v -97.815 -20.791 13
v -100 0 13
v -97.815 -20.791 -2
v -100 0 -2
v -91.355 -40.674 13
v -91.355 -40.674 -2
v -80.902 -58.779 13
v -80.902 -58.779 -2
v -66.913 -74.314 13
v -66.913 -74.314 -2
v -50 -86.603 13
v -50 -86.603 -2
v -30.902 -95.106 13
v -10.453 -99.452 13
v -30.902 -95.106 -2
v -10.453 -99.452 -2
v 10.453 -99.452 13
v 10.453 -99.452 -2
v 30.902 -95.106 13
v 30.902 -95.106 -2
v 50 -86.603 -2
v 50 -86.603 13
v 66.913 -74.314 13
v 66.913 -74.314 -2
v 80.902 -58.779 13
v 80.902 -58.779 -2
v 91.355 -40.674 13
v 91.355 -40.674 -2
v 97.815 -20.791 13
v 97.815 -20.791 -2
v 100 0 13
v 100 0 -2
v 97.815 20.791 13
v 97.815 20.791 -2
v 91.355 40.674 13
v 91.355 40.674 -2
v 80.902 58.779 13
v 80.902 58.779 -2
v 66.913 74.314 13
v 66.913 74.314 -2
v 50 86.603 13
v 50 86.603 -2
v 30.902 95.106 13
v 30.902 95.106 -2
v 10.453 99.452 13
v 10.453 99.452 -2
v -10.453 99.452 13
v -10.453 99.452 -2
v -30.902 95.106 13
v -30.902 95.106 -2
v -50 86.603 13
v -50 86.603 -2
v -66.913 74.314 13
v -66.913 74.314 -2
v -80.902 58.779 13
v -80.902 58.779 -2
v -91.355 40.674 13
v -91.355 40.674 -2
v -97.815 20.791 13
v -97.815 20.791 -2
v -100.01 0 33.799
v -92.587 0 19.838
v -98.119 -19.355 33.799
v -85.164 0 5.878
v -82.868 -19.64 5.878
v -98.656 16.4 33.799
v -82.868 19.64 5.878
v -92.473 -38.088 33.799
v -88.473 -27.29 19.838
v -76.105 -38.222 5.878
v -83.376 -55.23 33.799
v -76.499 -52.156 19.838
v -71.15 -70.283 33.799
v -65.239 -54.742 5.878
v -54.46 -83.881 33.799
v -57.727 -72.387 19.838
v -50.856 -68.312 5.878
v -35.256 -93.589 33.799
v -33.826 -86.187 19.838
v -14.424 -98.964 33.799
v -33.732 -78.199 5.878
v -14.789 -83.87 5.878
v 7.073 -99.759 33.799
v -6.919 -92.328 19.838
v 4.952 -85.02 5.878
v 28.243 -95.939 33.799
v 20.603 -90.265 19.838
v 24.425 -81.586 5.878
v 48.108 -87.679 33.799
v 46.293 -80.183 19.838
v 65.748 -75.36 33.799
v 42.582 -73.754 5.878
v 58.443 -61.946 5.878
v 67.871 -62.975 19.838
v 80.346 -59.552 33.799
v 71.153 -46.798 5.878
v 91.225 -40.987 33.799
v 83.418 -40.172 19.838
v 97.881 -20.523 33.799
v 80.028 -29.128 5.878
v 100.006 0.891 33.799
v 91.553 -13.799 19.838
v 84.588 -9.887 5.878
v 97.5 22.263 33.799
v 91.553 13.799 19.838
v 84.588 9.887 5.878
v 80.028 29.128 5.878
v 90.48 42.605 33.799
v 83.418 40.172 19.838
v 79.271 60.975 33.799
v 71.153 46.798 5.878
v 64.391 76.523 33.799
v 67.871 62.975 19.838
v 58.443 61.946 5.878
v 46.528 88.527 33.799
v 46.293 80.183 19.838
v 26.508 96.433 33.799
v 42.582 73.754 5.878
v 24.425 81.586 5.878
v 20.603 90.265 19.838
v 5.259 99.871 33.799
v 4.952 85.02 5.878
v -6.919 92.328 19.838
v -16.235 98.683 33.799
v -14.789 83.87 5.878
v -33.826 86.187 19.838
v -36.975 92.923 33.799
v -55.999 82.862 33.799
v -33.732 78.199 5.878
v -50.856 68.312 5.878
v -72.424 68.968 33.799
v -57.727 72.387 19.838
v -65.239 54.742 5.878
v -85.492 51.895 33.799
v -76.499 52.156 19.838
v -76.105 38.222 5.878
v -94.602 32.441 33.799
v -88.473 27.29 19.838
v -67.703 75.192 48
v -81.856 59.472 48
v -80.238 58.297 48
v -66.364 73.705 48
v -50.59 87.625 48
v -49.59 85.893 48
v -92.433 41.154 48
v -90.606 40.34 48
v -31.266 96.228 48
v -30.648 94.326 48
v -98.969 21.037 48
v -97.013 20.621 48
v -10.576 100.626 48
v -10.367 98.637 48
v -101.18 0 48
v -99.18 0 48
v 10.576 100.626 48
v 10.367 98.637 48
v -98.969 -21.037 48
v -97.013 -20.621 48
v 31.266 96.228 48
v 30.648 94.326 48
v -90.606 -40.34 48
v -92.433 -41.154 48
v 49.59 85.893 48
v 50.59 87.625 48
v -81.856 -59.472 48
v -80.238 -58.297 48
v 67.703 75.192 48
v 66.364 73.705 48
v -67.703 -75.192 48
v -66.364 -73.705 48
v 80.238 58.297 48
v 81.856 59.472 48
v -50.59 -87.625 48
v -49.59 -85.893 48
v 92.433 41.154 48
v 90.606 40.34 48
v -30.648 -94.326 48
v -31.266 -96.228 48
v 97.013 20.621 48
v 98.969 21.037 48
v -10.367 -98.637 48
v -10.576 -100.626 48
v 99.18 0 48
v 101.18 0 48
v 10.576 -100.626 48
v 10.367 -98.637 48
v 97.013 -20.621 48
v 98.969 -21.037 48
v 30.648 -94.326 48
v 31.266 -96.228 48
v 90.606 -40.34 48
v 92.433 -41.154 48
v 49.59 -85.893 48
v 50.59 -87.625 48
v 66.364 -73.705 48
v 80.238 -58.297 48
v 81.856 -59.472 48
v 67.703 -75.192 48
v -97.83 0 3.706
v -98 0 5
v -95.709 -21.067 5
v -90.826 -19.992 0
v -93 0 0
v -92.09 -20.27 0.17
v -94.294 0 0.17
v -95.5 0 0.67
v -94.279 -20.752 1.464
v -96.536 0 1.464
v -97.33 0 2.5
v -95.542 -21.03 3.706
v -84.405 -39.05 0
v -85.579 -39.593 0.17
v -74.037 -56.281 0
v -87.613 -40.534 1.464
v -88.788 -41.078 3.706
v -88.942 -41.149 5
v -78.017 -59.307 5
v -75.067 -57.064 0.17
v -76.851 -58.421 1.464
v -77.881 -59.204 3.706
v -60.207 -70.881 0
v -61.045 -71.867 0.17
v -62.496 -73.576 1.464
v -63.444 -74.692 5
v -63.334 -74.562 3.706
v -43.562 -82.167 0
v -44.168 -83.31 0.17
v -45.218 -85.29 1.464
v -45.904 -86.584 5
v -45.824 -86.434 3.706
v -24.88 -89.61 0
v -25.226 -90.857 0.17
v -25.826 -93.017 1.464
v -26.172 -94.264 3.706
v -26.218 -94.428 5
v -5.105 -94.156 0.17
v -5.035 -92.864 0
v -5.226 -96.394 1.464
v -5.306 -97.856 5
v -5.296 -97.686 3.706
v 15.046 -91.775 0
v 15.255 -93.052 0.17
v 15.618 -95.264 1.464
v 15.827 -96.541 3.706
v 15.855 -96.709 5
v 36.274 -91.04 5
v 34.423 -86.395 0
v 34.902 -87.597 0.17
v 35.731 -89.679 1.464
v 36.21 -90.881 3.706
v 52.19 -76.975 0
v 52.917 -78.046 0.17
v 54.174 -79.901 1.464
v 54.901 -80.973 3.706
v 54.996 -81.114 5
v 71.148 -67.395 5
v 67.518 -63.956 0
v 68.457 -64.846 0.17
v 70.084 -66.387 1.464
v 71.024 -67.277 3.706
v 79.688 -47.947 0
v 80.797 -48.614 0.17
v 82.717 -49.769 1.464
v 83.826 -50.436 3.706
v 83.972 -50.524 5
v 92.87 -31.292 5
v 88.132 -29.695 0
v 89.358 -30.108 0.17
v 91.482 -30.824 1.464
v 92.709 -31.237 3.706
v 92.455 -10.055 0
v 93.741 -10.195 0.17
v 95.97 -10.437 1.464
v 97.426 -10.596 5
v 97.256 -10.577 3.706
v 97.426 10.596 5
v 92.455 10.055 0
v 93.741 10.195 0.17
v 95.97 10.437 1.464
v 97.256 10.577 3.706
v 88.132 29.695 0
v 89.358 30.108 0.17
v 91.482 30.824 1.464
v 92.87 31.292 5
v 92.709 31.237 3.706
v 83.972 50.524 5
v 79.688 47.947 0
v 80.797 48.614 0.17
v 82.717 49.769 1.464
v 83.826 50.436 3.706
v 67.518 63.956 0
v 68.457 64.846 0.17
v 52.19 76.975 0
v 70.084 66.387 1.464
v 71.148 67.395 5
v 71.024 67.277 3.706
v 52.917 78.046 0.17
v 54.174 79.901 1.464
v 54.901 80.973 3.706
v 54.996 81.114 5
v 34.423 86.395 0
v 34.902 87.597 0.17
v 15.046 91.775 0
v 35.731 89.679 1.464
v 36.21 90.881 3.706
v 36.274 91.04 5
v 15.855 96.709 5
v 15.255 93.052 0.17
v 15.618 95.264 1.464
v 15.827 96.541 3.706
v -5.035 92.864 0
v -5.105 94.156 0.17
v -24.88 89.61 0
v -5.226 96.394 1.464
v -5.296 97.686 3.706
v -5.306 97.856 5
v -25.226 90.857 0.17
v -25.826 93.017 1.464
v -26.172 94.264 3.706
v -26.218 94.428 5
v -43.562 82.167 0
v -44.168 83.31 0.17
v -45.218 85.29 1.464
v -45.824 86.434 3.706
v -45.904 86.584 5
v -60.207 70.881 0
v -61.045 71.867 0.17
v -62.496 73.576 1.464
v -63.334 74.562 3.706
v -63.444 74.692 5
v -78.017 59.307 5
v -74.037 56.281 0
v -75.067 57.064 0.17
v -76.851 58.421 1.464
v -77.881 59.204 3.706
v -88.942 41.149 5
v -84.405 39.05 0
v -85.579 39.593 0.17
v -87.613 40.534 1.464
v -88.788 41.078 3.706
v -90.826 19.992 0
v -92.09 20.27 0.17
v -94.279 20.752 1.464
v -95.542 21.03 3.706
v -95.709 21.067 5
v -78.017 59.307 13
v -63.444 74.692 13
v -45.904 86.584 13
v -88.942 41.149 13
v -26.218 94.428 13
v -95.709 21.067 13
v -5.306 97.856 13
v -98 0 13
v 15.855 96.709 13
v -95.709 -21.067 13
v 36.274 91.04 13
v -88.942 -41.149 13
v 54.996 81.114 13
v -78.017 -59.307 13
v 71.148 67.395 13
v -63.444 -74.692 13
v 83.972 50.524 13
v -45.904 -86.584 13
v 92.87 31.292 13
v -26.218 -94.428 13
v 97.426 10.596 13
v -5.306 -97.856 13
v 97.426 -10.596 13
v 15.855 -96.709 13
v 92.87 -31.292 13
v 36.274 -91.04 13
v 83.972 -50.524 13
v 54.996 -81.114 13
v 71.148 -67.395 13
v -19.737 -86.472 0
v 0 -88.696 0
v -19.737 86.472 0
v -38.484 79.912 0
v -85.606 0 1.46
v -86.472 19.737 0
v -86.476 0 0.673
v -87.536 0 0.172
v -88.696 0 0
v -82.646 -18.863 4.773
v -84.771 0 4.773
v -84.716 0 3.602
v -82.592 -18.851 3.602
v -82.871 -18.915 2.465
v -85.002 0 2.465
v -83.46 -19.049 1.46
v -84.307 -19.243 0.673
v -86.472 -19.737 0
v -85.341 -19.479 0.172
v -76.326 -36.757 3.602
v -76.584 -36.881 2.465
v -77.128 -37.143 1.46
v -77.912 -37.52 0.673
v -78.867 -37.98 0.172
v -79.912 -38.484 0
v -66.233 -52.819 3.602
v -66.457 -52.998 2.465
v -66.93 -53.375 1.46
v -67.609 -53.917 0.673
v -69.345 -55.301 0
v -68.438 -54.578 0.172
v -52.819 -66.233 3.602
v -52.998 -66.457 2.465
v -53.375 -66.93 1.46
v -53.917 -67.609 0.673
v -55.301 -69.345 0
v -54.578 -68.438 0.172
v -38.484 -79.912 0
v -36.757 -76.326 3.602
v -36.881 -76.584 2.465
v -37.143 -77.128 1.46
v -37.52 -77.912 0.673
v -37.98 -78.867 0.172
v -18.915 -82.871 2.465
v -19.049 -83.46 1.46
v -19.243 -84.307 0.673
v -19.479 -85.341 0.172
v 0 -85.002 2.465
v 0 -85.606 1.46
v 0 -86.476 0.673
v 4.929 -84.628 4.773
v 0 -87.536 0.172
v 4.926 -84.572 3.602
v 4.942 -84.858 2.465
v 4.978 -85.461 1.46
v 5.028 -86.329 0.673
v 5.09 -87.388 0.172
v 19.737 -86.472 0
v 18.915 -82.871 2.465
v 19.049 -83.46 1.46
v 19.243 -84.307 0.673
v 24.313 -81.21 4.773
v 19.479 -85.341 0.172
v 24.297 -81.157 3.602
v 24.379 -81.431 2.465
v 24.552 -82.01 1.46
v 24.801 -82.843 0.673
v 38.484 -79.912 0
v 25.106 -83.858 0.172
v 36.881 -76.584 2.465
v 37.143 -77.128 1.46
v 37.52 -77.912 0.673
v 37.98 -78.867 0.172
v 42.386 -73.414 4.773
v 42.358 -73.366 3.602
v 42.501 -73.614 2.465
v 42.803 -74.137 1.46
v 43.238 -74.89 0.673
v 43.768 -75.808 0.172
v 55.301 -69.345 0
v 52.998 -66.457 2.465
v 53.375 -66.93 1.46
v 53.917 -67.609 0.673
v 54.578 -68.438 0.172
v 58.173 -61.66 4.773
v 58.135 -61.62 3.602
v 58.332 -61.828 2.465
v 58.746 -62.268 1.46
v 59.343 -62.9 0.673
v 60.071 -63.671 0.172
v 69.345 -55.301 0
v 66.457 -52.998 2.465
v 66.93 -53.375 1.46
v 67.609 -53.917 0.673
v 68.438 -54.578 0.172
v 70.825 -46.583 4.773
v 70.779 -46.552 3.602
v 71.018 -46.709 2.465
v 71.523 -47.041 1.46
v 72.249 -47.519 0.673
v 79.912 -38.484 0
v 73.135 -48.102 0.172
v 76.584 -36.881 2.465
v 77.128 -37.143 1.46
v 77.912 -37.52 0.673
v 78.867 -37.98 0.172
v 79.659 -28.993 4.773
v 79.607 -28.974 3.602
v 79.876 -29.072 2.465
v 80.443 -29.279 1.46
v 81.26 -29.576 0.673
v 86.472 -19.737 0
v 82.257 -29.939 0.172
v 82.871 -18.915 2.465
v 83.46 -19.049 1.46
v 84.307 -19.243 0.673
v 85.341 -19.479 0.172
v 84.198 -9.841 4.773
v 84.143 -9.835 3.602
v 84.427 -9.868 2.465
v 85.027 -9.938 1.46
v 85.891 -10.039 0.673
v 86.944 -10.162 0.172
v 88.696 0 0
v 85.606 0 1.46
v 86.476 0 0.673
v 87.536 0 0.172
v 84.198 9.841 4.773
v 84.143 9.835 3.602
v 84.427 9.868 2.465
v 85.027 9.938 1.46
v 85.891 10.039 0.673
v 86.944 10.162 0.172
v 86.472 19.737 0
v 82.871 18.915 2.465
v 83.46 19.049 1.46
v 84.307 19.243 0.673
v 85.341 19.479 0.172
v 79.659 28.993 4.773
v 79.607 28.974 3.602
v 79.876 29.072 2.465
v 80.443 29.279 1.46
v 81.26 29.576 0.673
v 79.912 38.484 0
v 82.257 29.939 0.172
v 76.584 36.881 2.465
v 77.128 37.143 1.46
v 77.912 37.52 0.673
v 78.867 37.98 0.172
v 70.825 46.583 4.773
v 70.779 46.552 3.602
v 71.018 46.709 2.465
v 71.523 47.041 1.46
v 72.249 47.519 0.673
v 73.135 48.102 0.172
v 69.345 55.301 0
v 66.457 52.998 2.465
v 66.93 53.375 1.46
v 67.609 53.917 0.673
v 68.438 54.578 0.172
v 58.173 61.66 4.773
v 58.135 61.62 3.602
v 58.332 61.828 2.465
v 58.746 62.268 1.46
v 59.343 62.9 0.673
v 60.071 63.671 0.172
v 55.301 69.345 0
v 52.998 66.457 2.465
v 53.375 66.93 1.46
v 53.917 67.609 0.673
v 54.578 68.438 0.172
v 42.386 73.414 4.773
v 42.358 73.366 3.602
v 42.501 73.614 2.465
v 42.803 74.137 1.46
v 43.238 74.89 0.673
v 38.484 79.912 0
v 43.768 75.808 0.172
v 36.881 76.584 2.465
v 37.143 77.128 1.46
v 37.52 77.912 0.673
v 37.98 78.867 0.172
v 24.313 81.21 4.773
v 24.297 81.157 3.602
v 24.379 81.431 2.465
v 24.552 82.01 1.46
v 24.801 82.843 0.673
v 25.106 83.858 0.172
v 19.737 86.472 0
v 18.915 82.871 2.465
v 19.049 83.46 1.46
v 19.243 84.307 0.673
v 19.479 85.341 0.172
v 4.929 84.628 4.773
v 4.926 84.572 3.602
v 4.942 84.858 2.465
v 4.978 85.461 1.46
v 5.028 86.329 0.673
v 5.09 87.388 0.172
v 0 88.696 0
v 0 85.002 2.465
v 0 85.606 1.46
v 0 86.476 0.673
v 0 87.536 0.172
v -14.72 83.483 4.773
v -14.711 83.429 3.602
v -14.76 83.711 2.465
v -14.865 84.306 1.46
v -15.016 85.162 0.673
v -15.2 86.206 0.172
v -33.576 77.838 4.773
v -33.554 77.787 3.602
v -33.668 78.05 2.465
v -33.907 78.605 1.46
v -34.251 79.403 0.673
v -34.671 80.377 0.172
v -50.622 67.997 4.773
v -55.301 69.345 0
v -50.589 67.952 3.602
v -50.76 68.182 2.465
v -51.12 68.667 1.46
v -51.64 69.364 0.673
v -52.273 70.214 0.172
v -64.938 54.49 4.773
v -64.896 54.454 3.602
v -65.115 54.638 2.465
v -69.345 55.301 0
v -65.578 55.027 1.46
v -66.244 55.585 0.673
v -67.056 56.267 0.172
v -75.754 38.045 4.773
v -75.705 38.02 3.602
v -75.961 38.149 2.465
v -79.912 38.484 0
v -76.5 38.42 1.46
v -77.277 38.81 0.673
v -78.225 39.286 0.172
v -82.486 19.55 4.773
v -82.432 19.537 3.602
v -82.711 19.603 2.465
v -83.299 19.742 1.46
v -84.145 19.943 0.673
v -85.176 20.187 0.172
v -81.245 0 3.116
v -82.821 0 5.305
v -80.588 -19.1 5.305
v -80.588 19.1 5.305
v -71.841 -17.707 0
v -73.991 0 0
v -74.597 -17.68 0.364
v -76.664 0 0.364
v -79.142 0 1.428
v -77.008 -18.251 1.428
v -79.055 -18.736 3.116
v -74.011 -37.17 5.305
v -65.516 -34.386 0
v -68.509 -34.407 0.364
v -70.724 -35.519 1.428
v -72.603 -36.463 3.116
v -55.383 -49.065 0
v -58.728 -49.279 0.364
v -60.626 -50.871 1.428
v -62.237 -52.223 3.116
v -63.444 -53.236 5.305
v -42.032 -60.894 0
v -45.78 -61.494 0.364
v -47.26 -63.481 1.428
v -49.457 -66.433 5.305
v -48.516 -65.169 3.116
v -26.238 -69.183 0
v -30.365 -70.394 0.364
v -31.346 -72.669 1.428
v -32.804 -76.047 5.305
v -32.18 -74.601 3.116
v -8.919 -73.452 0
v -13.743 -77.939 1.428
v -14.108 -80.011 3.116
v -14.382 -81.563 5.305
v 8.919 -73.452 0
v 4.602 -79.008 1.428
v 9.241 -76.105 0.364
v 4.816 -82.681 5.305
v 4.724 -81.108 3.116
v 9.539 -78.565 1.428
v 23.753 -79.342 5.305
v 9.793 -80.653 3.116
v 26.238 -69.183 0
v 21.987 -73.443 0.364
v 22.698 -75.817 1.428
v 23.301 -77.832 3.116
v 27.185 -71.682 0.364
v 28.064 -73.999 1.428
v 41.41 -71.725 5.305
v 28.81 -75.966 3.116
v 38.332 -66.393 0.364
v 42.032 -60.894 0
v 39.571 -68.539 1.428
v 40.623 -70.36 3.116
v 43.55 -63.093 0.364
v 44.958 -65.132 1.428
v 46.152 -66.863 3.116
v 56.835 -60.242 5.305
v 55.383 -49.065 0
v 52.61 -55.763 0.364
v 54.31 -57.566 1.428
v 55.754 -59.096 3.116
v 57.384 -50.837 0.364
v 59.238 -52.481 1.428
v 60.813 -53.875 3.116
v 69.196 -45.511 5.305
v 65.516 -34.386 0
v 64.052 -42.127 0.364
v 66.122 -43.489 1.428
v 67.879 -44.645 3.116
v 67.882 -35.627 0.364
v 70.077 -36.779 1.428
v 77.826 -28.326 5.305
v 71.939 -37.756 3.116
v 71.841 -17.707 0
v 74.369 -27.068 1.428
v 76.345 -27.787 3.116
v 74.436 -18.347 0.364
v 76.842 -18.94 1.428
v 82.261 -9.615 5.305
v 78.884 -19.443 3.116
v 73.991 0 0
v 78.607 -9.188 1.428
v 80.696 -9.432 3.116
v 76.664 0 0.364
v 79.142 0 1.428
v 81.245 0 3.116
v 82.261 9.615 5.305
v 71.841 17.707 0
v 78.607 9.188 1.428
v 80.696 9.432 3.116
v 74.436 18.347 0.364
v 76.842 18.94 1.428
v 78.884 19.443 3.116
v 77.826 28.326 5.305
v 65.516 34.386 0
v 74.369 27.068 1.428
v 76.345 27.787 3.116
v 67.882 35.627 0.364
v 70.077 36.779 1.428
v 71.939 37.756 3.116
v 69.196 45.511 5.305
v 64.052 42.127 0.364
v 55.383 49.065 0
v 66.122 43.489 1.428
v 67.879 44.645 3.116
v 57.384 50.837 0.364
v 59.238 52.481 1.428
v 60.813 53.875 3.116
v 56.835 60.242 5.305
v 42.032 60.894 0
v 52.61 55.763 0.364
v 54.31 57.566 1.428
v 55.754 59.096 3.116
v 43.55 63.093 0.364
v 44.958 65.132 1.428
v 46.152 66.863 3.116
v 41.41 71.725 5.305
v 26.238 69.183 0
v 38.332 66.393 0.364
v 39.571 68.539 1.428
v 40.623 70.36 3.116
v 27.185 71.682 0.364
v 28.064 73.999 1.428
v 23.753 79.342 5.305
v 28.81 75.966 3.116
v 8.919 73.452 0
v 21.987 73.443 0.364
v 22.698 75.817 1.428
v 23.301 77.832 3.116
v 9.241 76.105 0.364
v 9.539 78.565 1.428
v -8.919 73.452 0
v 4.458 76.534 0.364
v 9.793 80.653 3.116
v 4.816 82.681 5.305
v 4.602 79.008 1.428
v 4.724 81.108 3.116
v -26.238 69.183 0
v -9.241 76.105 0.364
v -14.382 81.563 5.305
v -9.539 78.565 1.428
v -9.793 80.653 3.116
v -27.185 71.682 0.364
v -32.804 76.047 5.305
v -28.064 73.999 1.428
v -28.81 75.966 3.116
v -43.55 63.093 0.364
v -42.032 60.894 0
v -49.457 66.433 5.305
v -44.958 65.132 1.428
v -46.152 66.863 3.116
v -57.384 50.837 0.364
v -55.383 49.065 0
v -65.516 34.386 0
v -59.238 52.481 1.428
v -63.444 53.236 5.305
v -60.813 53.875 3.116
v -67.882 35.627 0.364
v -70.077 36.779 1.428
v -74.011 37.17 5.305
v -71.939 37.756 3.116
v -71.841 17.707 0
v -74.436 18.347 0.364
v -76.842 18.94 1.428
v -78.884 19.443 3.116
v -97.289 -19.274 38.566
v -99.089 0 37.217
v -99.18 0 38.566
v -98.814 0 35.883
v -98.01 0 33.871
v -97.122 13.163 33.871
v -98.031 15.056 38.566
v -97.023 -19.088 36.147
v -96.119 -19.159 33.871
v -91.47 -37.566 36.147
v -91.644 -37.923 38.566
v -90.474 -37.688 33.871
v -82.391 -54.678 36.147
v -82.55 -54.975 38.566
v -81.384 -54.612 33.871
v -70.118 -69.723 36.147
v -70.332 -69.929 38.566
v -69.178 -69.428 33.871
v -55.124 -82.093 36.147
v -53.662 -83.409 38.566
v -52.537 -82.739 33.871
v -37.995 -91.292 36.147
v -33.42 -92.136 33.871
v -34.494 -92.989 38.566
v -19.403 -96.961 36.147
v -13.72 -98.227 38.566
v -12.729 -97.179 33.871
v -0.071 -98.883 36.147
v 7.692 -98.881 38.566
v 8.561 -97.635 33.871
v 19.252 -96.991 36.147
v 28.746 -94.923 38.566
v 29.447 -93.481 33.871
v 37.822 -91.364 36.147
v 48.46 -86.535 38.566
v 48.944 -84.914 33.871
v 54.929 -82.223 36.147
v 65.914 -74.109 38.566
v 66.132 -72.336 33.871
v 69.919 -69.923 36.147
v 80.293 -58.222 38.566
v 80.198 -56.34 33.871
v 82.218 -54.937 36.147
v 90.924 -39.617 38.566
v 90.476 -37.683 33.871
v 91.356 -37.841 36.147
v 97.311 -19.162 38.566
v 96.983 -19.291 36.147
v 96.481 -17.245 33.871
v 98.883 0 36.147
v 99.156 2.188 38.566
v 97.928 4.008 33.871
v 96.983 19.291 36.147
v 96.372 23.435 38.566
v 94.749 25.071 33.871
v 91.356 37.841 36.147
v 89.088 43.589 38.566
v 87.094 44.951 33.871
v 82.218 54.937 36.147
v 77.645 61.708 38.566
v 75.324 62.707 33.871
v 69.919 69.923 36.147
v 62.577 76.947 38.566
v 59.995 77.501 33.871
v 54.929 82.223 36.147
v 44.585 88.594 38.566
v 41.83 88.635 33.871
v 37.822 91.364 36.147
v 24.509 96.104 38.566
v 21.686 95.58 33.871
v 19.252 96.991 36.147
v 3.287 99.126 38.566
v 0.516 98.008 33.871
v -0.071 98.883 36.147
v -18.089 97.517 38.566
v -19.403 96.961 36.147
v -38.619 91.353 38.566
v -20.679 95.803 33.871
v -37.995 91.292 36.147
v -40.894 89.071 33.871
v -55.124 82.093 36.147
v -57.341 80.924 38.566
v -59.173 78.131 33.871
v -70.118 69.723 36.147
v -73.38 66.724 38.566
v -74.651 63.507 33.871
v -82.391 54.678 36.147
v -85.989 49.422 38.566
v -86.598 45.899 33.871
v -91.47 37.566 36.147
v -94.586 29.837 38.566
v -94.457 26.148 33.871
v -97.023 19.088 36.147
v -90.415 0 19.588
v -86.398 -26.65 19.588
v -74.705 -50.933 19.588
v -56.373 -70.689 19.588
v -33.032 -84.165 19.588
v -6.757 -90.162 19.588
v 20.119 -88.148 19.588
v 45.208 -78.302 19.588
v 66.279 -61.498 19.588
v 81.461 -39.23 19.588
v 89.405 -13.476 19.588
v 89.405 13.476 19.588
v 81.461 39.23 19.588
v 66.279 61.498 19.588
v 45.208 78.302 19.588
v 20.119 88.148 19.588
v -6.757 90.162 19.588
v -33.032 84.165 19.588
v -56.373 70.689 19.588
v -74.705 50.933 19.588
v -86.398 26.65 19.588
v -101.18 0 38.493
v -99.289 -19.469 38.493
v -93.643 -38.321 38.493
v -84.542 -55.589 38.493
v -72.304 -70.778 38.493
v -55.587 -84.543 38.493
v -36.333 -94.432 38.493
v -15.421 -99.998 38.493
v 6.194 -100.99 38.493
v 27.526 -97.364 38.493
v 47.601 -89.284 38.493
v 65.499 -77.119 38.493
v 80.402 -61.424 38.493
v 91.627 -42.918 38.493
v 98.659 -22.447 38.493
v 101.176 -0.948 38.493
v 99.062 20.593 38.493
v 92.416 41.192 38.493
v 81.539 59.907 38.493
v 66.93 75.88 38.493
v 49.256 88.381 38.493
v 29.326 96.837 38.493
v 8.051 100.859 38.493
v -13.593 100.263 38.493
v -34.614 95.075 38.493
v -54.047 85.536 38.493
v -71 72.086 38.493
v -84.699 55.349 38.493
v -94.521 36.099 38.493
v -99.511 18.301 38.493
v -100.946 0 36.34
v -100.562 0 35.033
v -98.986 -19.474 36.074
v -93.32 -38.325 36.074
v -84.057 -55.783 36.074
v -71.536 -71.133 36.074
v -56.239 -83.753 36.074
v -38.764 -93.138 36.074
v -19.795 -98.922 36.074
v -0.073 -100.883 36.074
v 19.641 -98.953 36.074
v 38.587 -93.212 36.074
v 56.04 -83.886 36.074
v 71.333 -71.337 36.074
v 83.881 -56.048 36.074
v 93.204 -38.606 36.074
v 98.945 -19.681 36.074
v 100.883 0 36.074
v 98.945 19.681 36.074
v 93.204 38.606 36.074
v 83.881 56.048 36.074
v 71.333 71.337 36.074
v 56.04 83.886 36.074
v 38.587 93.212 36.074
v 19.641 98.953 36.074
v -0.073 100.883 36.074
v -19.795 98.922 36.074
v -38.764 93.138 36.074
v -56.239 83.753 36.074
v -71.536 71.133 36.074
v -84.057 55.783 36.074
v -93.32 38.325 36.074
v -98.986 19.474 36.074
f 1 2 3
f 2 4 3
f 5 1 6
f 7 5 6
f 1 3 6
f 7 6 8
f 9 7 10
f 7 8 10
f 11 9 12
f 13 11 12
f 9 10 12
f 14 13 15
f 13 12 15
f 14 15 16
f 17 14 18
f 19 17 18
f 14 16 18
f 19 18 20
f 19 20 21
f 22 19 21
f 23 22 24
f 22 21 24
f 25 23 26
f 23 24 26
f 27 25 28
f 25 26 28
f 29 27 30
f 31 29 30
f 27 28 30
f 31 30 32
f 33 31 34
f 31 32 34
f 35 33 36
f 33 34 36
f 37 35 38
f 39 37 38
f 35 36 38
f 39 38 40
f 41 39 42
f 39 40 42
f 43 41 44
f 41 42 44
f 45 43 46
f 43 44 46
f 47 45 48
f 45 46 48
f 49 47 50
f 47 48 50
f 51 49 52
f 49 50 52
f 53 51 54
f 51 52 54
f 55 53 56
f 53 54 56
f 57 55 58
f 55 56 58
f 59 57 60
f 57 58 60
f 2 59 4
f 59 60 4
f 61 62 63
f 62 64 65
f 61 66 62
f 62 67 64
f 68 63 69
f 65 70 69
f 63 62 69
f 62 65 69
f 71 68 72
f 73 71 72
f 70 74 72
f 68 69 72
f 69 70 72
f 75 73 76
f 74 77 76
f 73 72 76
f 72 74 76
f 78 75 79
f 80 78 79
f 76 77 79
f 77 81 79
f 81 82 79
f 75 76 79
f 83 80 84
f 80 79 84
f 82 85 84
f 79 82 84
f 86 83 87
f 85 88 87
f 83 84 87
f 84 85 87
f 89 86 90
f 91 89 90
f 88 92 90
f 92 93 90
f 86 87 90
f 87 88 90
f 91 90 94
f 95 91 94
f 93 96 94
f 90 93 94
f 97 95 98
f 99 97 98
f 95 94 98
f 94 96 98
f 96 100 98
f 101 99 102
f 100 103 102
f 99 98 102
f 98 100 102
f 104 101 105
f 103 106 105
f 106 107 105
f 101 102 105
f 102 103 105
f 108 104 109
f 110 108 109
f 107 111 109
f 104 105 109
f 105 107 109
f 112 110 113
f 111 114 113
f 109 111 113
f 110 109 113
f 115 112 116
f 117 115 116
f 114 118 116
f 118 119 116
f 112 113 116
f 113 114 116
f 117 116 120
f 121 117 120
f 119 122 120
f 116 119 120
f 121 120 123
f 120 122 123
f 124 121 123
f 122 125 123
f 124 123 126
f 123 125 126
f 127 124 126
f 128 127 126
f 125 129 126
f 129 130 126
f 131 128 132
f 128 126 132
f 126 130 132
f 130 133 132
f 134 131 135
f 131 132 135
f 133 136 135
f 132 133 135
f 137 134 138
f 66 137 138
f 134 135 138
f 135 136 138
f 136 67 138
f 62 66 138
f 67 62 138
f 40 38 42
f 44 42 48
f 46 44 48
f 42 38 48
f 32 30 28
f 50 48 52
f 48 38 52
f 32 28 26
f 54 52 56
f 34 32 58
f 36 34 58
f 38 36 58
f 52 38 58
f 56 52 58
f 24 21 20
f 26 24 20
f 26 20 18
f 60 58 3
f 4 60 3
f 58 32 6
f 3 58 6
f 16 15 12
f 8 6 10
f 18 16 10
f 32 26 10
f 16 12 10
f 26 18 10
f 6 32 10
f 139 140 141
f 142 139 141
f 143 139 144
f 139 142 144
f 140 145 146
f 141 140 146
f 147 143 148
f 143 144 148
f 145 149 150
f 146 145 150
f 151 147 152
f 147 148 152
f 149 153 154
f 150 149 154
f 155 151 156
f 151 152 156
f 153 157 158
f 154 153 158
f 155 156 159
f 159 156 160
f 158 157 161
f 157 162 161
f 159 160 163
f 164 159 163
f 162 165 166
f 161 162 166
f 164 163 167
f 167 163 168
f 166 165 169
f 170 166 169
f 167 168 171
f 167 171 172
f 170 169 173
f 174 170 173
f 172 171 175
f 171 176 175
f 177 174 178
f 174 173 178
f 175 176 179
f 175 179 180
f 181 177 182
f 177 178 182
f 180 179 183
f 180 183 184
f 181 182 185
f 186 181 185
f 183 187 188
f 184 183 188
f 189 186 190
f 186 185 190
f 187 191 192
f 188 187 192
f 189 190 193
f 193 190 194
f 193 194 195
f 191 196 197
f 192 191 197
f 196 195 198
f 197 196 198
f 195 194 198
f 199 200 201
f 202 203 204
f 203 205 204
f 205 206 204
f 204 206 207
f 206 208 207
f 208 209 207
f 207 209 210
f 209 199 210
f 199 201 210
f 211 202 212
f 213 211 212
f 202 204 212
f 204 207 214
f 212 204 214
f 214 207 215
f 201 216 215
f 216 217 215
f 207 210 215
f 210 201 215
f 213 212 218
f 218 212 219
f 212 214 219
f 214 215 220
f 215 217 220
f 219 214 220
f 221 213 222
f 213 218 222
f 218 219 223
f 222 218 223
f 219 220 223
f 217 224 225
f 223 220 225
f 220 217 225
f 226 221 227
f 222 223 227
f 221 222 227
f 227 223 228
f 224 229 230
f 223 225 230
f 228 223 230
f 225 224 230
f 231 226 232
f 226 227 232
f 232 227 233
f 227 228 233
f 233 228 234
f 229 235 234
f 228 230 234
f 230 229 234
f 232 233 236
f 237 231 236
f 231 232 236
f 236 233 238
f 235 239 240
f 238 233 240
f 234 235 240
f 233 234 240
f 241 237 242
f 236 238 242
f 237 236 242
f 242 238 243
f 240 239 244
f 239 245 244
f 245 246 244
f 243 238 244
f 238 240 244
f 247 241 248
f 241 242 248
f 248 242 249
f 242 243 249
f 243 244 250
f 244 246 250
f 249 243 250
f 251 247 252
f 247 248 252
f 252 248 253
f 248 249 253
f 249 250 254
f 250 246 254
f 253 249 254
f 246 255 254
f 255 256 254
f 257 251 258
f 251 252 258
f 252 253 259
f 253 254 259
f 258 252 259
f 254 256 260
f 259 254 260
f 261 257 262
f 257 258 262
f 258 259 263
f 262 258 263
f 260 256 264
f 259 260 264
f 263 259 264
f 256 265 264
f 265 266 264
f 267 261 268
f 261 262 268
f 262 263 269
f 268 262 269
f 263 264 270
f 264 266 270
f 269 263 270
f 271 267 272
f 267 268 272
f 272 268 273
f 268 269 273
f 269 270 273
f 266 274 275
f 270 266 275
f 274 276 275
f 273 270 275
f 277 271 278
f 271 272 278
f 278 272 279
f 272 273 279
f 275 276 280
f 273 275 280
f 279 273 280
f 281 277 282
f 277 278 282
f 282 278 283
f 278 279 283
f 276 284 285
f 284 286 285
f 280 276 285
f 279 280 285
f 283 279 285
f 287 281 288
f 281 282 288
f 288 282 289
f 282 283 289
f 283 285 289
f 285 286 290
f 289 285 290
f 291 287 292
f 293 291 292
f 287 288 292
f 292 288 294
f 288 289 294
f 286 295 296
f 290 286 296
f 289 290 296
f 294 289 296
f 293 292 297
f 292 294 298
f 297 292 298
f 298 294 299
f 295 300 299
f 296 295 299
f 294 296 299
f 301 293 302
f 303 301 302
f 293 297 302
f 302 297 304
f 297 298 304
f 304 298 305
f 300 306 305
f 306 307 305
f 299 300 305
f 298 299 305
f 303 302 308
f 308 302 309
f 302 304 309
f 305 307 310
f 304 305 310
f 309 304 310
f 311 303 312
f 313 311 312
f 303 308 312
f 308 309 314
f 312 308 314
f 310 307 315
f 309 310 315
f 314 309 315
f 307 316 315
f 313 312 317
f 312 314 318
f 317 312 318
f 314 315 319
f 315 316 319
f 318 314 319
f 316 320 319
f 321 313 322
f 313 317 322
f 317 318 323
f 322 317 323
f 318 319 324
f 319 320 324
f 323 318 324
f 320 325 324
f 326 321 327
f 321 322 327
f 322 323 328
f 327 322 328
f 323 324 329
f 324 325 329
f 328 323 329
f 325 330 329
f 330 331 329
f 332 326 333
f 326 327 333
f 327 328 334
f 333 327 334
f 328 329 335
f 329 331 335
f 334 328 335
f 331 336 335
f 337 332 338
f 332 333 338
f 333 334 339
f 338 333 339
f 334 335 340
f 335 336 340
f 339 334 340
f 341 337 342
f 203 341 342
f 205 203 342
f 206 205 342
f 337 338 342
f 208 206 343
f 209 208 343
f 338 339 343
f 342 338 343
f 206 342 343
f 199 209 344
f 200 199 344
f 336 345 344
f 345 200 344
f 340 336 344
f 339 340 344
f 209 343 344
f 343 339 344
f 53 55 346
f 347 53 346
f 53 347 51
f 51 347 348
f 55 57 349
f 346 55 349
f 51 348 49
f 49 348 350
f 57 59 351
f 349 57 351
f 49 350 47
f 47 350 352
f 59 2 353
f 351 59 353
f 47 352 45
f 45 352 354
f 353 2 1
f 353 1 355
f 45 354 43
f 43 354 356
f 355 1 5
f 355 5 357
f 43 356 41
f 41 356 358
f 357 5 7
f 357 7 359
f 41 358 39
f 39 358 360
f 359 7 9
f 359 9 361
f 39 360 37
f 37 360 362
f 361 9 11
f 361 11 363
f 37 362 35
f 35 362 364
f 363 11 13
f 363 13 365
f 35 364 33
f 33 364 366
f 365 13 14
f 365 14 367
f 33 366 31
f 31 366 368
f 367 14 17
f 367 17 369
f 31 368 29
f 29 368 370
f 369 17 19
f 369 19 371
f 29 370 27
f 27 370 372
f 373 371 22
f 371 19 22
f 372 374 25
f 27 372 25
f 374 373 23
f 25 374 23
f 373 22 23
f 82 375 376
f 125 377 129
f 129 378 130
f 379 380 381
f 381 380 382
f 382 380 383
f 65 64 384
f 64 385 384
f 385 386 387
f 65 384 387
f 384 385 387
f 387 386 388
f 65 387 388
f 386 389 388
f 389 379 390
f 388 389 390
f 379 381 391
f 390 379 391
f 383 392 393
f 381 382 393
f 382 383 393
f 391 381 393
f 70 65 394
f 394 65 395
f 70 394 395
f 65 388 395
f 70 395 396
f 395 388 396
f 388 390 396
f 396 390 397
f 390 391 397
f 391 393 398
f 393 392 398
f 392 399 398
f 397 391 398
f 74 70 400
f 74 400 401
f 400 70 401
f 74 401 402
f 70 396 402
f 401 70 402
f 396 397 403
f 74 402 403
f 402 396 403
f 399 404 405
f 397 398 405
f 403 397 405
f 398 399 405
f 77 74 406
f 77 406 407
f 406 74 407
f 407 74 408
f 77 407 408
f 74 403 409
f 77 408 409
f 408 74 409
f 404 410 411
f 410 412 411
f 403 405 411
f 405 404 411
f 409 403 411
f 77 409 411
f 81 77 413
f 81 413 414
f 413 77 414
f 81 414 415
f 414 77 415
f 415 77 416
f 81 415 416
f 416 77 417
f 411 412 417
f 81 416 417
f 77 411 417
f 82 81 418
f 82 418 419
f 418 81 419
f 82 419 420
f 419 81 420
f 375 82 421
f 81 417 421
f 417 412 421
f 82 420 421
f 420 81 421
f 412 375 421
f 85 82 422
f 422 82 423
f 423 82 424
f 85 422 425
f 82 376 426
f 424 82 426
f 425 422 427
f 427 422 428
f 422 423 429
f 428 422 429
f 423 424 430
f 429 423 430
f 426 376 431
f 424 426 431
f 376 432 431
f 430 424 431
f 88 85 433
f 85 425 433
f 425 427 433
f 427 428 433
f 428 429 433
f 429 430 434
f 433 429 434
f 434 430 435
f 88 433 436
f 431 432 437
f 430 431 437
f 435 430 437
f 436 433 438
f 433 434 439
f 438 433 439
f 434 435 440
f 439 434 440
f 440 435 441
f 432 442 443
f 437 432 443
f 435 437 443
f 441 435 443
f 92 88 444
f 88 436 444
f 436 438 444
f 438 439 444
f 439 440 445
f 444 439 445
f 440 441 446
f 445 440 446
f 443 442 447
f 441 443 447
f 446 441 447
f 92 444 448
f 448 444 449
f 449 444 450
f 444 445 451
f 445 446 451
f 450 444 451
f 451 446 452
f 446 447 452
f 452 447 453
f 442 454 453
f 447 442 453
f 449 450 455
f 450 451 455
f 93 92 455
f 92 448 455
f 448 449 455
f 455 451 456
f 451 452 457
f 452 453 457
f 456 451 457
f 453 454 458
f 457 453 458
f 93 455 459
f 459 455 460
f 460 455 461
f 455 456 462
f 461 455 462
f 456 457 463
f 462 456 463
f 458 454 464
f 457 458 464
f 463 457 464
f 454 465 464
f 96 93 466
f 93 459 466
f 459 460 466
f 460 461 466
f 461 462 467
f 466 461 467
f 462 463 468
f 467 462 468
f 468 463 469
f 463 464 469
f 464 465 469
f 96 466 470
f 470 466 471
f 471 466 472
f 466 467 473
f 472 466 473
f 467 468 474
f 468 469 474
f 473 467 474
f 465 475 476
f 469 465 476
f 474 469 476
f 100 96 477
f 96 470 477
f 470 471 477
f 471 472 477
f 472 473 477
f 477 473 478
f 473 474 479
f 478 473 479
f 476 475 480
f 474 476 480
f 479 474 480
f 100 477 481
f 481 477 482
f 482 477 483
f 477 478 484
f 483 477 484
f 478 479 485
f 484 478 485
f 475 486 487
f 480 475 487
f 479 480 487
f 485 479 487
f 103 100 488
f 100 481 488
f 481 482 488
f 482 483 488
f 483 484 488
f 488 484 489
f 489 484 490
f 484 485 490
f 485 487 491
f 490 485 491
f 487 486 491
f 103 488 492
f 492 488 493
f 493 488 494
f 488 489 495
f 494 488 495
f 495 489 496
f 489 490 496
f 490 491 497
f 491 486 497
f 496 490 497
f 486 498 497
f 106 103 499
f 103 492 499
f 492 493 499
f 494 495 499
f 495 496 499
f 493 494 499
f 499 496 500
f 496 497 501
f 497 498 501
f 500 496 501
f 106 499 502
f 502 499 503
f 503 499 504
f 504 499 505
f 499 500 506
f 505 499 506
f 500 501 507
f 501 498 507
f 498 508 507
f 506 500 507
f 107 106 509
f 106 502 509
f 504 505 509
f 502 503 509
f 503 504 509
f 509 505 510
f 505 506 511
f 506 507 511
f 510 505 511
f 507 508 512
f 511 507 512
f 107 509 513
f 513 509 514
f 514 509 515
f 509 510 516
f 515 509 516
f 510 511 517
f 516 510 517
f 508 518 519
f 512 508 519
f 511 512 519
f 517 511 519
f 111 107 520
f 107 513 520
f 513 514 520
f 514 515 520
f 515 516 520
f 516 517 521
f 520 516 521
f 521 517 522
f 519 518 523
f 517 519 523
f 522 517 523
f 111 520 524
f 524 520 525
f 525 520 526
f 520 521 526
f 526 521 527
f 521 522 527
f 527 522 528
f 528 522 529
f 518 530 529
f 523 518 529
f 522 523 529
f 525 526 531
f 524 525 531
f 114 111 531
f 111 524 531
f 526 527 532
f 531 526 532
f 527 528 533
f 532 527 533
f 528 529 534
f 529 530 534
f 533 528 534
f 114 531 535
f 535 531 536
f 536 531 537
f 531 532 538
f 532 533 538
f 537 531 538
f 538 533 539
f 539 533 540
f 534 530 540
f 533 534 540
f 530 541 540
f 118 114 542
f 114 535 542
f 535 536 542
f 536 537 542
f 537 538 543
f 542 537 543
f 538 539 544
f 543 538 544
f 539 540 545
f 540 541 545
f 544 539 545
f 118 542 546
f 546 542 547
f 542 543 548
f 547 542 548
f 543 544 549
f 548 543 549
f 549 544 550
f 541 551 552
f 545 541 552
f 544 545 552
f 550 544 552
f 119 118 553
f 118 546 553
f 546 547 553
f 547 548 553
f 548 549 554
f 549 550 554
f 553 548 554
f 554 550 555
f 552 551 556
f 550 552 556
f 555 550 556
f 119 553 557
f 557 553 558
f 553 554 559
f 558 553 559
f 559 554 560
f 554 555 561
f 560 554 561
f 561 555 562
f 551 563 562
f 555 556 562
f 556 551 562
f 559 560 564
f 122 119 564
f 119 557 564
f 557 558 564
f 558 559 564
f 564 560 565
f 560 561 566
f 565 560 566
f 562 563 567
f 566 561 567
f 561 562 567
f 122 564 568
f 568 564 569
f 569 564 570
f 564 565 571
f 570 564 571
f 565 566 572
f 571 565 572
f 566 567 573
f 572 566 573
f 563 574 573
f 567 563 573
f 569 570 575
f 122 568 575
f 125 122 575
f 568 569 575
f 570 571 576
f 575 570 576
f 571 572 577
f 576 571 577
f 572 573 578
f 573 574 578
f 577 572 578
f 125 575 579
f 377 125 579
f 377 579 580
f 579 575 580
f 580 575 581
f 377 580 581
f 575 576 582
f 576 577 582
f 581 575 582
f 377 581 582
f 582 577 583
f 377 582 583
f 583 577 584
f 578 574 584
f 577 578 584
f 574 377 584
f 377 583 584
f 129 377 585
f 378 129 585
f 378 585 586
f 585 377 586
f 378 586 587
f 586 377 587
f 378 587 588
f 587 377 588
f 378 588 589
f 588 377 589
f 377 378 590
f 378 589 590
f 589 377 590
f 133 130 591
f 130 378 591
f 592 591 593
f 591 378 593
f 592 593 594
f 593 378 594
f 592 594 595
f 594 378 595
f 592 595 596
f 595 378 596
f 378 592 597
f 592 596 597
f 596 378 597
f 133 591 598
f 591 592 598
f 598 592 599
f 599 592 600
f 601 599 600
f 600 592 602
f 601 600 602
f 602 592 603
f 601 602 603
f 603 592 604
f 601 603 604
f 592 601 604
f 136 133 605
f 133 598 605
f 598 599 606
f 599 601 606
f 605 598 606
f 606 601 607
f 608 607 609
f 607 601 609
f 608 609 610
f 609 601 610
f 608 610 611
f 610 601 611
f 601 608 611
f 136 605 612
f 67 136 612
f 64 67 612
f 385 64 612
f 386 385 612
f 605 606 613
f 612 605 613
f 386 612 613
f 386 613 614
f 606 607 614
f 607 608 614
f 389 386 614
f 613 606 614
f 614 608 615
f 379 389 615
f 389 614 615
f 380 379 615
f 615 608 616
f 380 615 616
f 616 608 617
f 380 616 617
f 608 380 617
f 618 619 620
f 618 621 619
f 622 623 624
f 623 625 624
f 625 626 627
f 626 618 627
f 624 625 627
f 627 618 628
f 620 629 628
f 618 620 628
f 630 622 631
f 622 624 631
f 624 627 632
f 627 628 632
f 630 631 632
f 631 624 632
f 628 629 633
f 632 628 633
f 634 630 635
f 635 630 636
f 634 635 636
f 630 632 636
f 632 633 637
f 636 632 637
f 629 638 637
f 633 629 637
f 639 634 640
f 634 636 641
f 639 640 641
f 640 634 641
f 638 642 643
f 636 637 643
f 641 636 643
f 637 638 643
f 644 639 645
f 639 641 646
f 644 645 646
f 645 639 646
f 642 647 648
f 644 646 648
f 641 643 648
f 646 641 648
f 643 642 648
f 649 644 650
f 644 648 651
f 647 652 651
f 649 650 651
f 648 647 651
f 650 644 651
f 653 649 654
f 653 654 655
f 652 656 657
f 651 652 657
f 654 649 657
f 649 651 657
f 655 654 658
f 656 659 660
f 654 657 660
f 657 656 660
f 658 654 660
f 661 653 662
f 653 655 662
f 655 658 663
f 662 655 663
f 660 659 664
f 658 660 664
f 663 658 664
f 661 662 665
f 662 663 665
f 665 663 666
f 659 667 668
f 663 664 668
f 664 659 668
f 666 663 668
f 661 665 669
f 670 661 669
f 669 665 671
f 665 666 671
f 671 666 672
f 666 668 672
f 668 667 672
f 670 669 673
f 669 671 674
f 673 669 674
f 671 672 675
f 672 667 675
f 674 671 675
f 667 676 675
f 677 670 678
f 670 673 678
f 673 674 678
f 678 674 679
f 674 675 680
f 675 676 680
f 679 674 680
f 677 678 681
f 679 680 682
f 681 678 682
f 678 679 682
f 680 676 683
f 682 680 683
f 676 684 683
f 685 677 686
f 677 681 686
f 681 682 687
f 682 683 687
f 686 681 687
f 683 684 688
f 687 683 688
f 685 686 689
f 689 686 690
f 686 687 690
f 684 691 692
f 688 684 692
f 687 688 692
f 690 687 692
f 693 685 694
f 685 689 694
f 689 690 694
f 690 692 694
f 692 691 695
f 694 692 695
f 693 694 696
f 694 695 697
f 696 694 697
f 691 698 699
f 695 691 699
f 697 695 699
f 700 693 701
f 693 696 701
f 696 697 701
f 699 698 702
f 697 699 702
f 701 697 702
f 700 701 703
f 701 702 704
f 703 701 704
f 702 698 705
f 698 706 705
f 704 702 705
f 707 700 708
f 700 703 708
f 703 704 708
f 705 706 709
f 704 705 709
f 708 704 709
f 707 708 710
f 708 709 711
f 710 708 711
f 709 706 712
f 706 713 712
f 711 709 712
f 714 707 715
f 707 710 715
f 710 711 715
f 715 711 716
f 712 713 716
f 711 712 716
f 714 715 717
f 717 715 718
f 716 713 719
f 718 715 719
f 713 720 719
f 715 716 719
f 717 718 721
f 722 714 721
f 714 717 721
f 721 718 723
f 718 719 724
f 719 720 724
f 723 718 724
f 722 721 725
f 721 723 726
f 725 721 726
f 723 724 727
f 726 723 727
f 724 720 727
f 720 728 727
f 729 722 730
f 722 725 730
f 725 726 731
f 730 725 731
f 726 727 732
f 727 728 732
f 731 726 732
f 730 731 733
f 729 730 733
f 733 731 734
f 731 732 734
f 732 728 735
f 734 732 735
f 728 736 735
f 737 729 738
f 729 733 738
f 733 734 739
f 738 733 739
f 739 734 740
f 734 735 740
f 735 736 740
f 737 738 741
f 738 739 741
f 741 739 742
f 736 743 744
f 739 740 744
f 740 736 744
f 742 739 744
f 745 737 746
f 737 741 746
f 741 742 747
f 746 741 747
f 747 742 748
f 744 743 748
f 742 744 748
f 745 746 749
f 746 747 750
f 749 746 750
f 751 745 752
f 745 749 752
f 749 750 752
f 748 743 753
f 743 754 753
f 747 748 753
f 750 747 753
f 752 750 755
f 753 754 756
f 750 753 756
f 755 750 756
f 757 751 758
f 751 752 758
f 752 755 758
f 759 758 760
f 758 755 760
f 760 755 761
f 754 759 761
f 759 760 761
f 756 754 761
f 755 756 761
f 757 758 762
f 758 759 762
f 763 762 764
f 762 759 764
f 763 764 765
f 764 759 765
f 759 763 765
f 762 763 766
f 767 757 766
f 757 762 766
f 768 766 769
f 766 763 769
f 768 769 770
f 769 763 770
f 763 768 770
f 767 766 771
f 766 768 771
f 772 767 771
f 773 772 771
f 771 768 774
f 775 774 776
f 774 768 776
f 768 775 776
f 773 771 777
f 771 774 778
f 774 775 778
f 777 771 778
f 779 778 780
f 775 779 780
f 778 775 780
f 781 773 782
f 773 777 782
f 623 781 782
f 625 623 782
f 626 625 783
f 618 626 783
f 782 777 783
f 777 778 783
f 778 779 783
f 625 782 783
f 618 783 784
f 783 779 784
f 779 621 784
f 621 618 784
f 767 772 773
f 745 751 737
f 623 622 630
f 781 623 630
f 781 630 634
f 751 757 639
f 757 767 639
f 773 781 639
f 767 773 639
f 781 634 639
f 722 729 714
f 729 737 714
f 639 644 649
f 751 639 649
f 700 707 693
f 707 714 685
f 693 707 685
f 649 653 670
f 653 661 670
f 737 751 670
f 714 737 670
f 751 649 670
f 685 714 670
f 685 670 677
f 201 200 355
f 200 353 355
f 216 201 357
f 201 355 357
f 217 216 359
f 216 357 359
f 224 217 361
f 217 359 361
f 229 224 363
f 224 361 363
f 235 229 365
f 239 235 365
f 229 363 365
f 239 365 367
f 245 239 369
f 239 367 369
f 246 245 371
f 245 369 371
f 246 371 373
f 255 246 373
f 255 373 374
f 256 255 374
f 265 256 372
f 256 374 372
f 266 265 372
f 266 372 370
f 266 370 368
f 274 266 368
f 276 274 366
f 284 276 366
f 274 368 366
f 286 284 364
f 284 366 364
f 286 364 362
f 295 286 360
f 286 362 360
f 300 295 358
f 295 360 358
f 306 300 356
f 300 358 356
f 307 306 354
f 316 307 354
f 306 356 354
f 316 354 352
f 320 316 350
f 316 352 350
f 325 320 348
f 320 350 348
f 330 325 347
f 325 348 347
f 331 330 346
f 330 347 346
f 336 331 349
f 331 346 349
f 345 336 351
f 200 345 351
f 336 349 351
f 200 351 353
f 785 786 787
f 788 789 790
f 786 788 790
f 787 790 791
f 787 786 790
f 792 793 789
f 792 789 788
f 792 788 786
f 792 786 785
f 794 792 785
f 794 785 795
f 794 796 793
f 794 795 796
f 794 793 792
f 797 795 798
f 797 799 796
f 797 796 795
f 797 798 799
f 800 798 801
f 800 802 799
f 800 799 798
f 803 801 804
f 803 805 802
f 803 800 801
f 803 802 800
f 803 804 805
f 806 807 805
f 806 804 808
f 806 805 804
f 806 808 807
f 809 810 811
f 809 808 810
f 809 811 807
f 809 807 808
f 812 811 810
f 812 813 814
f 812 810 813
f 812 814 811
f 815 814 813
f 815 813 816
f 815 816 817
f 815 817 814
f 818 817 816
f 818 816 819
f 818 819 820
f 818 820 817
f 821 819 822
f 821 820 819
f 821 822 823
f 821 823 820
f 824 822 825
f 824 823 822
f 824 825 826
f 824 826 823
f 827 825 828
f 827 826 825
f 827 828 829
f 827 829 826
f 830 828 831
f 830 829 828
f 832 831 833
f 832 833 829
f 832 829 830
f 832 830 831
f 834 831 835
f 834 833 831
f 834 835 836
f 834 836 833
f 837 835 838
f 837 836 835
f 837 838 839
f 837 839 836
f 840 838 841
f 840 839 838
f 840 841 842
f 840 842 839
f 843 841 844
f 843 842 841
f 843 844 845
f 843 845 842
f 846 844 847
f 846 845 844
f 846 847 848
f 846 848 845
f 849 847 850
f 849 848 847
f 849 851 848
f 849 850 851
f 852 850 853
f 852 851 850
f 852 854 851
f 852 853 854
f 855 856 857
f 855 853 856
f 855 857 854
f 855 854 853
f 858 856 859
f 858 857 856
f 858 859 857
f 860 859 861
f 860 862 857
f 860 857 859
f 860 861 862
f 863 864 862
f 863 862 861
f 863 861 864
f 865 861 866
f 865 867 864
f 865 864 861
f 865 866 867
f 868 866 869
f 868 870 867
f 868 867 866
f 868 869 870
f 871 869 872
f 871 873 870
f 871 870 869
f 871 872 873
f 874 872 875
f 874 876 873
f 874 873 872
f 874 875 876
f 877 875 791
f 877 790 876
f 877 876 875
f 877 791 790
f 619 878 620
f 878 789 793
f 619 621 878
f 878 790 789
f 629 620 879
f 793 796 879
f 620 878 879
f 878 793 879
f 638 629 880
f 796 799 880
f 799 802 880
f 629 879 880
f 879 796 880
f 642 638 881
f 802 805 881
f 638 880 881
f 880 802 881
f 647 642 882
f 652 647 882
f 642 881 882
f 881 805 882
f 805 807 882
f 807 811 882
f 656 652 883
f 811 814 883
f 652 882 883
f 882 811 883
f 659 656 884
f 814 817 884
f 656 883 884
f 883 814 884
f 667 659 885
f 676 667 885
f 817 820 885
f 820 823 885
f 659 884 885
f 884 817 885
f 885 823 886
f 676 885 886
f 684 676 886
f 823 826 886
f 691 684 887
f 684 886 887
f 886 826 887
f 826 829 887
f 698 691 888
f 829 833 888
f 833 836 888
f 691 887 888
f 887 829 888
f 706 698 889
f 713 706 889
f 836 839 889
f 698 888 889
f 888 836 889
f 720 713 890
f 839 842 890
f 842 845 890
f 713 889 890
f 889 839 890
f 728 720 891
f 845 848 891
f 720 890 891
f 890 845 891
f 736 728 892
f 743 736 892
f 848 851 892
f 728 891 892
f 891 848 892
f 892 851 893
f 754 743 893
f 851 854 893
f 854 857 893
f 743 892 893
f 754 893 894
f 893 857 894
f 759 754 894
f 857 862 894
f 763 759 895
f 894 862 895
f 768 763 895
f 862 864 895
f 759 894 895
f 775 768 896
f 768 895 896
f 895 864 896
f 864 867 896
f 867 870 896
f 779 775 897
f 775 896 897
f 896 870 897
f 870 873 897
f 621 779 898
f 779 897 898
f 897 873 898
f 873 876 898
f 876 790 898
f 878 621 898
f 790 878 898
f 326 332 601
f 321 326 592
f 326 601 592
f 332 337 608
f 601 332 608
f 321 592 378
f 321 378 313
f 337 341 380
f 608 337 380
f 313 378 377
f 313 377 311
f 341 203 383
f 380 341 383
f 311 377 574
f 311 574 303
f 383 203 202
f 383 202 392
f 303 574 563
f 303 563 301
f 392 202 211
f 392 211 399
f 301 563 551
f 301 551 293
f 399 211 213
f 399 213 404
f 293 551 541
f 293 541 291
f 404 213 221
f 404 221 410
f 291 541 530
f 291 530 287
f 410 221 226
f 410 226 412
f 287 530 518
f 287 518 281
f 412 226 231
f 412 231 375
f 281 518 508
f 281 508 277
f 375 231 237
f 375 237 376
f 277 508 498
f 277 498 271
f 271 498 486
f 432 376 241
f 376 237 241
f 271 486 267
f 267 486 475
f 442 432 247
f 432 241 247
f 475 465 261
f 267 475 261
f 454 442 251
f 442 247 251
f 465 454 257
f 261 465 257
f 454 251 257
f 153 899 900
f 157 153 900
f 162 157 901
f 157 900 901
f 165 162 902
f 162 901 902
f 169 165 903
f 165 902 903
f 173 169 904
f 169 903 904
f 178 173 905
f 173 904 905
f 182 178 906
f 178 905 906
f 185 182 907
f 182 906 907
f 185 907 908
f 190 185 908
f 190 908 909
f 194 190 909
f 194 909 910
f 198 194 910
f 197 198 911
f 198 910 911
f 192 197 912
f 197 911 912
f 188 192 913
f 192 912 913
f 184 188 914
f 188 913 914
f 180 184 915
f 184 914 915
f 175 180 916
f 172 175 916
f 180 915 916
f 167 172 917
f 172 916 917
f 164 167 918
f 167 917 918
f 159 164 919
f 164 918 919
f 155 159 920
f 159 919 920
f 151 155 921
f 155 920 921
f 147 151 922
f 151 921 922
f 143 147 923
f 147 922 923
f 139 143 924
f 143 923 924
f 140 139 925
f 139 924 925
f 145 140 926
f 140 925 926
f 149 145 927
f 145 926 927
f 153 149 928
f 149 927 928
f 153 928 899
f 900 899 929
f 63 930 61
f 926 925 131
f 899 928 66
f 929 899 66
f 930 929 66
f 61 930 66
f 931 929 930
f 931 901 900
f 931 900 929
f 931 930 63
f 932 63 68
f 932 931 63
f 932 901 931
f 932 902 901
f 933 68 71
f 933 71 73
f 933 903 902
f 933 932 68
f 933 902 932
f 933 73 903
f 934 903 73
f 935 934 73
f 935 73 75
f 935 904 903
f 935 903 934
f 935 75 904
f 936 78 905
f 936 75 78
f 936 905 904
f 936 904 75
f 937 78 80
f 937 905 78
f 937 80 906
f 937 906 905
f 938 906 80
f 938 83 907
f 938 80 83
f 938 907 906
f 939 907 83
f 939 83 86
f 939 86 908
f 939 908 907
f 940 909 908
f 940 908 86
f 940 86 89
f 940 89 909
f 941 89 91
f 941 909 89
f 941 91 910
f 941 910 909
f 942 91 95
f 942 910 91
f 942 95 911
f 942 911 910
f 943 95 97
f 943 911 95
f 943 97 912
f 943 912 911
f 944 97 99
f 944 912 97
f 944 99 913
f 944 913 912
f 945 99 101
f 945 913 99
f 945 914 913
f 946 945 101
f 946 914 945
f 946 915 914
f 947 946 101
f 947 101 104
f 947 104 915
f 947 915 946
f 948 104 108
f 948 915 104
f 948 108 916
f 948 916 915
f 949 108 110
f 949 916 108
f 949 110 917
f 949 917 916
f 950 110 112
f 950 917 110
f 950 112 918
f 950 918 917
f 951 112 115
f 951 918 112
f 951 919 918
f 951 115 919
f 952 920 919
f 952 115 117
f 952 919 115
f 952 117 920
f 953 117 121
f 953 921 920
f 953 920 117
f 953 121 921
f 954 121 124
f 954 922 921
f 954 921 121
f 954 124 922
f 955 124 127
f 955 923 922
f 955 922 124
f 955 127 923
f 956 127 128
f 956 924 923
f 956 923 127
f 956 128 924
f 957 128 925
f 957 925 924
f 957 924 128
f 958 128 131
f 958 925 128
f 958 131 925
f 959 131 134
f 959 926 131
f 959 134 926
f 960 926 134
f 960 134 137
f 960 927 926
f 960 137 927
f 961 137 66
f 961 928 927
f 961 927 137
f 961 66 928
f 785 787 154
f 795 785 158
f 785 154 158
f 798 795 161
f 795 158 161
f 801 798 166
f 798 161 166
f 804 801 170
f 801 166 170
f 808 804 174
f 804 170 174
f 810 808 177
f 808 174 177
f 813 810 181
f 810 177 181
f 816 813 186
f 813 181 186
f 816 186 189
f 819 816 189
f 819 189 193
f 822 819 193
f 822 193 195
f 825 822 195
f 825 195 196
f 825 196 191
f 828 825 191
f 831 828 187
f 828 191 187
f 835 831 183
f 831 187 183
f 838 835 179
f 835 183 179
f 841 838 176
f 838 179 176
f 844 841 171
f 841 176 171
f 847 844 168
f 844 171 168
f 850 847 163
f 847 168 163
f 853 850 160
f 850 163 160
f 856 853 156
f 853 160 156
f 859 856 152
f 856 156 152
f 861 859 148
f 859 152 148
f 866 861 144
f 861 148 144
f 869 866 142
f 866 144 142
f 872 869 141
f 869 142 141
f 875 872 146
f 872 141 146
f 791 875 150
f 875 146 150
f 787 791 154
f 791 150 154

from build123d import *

# Parameters (mm, degrees)
F2_R = 10


with BuildPart() as f1:
    # F0 (on Front) → F1 (revolve)
    with BuildSketch(Plane.XZ):
        with BuildLine():
            Line((0, -2), (0, 0))
            Line((0, 0), (-73.991394, 0))
            ThreePointArc((-73.991394, 0), (-79.141775, 1.428327), (-82.82087, 5.305284))
            Line((-82.82087, 5.305284), (-99.180166, 36.072645))
            Line((-99.180166, 36.072645), (-99.180166, 48))
            Line((-99.180166, 48), (-101.180166, 48))
            Line((-101.180166, 48), (-101.180166, 36))
            Line((-101.180166, 36), (-85.163954, 5.877886))
            ThreePointArc((-85.163954, 5.877886), (-85.267075, 1.939848), (-88.695744, 0))
            Line((-88.695744, 0), (-93, 0))
            ThreePointArc((-93, 0), (-96.535534, 1.464466), (-98, 5))
            Line((-98, 5), (-98, 13))
            Line((-98, 13), (-100, 13))
            Line((-100, 13), (-100, -2))
            Line((-100, -2), (0, -2))
        make_face()
    revolve(axis=Axis((0, 0, -1), (0, 0, 1)))

    # F2
    f2_edges = [f1.edges().sort_by_distance(p)[0] for p in [
        (99.180166, 0, 36.072645),
        (101.180166, 0, 36),
    ]]
    fillet(f2_edges, radius=F2_R)


solid = f1.part
